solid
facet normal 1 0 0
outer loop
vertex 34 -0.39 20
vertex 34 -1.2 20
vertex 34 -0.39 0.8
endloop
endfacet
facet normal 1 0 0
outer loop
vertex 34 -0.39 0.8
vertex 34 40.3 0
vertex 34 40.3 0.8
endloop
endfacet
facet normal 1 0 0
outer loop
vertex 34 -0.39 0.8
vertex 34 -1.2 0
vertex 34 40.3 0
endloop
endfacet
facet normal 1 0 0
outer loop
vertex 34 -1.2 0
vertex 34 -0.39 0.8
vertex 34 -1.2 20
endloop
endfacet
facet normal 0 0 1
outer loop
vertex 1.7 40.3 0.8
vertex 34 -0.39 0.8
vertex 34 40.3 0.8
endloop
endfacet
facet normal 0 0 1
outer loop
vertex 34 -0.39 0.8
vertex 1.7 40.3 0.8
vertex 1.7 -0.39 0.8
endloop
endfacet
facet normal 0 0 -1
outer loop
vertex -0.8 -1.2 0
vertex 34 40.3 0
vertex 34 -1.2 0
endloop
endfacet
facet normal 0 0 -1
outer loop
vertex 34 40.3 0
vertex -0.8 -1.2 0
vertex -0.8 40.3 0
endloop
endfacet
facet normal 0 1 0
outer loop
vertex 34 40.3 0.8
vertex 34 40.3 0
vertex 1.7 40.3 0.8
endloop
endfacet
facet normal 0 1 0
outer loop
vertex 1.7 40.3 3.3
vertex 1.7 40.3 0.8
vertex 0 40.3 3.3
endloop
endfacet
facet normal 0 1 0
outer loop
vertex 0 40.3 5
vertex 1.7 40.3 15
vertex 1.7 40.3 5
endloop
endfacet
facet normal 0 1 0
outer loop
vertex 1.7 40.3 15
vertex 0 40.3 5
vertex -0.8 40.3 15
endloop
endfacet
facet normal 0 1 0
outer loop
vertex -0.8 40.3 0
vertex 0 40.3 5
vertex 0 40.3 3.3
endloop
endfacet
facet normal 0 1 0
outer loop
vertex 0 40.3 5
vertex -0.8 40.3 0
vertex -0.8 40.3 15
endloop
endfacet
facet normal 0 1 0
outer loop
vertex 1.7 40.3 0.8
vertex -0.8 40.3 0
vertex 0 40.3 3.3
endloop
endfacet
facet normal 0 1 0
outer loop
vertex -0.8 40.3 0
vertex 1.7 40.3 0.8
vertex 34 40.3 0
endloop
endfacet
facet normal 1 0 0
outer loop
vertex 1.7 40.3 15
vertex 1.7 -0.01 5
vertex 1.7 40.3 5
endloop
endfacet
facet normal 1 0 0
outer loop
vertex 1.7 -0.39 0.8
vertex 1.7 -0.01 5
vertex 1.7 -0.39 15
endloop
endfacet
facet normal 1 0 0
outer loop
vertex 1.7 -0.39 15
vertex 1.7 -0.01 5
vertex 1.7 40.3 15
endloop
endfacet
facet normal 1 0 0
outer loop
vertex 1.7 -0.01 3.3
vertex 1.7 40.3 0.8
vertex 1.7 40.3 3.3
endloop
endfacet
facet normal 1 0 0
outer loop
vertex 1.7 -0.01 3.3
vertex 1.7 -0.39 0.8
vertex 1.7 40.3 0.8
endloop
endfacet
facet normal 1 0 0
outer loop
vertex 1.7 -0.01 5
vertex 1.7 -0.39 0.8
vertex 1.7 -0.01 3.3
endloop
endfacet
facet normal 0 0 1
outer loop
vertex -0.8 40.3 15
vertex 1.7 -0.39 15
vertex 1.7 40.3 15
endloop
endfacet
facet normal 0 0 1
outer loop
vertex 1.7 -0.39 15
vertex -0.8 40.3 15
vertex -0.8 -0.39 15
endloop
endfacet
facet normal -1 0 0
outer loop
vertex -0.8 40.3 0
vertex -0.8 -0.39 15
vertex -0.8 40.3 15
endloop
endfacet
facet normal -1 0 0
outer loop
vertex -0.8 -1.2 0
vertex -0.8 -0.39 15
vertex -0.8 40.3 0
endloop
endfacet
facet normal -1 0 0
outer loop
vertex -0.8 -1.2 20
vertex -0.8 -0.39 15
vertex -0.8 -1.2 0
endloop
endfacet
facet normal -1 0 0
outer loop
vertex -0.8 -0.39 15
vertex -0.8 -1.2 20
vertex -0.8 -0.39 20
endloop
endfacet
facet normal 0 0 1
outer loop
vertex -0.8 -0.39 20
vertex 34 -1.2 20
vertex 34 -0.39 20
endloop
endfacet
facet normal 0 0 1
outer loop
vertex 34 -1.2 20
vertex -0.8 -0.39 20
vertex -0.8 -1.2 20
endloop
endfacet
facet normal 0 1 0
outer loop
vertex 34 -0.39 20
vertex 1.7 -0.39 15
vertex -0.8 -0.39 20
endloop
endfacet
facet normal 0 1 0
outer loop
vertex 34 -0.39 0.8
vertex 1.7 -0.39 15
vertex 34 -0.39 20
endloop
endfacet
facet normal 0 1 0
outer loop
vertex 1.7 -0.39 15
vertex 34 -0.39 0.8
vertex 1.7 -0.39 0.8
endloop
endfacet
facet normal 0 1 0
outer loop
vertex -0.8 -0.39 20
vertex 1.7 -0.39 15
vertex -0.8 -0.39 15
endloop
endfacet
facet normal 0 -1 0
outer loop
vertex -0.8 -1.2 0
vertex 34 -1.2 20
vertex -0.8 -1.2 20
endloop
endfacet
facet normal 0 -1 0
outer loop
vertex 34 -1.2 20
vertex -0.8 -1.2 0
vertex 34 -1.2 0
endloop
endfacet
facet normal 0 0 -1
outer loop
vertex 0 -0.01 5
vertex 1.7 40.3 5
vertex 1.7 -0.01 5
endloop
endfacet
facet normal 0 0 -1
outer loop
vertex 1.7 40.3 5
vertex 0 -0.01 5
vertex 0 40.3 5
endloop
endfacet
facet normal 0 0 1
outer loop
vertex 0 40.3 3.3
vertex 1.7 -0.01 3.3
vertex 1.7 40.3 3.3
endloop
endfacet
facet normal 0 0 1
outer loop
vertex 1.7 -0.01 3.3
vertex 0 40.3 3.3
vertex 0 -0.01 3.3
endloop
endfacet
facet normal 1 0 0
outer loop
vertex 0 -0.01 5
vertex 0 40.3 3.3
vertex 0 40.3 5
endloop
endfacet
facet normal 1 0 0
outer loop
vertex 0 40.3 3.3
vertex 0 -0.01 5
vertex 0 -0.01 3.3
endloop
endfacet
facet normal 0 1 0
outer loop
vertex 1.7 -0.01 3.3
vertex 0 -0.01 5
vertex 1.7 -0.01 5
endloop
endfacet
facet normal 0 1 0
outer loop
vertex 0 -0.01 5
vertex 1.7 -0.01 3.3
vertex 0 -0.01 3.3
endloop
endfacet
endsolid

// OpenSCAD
boardWidth=34;
boardLength=40.3;
overhangSize=1.7;
solderDepth=2.5;
wallSize=0.8;
boardDepth=1.7;
relayDepth=15;
capacitorDepth=10;

difference() {
    union() {
        translate([0, - wallSize / 2, 0]) {
            cube([boardWidth, boardLength + wallSize / 2, wallSize]);
        }
        translate([-wallSize, -wallSize / 2, 0]) {
            cube([wallSize + overhangSize, boardLength + wallSize / 2, wallSize + solderDepth + boardDepth + max(wallSize, capacitorDepth)]); 
        }
        translate([-wallSize, -wallSize - wallSize / 2, 0]) {
            cube([wallSize + boardWidth, wallSize + 0.01, wallSize + solderDepth + boardDepth + relayDepth]);
        }
    }
    translate([0, -0.01, wallSize + solderDepth]) {
        cube([boardWidth, boardLength + 0.02, boardDepth]);
    }
}
